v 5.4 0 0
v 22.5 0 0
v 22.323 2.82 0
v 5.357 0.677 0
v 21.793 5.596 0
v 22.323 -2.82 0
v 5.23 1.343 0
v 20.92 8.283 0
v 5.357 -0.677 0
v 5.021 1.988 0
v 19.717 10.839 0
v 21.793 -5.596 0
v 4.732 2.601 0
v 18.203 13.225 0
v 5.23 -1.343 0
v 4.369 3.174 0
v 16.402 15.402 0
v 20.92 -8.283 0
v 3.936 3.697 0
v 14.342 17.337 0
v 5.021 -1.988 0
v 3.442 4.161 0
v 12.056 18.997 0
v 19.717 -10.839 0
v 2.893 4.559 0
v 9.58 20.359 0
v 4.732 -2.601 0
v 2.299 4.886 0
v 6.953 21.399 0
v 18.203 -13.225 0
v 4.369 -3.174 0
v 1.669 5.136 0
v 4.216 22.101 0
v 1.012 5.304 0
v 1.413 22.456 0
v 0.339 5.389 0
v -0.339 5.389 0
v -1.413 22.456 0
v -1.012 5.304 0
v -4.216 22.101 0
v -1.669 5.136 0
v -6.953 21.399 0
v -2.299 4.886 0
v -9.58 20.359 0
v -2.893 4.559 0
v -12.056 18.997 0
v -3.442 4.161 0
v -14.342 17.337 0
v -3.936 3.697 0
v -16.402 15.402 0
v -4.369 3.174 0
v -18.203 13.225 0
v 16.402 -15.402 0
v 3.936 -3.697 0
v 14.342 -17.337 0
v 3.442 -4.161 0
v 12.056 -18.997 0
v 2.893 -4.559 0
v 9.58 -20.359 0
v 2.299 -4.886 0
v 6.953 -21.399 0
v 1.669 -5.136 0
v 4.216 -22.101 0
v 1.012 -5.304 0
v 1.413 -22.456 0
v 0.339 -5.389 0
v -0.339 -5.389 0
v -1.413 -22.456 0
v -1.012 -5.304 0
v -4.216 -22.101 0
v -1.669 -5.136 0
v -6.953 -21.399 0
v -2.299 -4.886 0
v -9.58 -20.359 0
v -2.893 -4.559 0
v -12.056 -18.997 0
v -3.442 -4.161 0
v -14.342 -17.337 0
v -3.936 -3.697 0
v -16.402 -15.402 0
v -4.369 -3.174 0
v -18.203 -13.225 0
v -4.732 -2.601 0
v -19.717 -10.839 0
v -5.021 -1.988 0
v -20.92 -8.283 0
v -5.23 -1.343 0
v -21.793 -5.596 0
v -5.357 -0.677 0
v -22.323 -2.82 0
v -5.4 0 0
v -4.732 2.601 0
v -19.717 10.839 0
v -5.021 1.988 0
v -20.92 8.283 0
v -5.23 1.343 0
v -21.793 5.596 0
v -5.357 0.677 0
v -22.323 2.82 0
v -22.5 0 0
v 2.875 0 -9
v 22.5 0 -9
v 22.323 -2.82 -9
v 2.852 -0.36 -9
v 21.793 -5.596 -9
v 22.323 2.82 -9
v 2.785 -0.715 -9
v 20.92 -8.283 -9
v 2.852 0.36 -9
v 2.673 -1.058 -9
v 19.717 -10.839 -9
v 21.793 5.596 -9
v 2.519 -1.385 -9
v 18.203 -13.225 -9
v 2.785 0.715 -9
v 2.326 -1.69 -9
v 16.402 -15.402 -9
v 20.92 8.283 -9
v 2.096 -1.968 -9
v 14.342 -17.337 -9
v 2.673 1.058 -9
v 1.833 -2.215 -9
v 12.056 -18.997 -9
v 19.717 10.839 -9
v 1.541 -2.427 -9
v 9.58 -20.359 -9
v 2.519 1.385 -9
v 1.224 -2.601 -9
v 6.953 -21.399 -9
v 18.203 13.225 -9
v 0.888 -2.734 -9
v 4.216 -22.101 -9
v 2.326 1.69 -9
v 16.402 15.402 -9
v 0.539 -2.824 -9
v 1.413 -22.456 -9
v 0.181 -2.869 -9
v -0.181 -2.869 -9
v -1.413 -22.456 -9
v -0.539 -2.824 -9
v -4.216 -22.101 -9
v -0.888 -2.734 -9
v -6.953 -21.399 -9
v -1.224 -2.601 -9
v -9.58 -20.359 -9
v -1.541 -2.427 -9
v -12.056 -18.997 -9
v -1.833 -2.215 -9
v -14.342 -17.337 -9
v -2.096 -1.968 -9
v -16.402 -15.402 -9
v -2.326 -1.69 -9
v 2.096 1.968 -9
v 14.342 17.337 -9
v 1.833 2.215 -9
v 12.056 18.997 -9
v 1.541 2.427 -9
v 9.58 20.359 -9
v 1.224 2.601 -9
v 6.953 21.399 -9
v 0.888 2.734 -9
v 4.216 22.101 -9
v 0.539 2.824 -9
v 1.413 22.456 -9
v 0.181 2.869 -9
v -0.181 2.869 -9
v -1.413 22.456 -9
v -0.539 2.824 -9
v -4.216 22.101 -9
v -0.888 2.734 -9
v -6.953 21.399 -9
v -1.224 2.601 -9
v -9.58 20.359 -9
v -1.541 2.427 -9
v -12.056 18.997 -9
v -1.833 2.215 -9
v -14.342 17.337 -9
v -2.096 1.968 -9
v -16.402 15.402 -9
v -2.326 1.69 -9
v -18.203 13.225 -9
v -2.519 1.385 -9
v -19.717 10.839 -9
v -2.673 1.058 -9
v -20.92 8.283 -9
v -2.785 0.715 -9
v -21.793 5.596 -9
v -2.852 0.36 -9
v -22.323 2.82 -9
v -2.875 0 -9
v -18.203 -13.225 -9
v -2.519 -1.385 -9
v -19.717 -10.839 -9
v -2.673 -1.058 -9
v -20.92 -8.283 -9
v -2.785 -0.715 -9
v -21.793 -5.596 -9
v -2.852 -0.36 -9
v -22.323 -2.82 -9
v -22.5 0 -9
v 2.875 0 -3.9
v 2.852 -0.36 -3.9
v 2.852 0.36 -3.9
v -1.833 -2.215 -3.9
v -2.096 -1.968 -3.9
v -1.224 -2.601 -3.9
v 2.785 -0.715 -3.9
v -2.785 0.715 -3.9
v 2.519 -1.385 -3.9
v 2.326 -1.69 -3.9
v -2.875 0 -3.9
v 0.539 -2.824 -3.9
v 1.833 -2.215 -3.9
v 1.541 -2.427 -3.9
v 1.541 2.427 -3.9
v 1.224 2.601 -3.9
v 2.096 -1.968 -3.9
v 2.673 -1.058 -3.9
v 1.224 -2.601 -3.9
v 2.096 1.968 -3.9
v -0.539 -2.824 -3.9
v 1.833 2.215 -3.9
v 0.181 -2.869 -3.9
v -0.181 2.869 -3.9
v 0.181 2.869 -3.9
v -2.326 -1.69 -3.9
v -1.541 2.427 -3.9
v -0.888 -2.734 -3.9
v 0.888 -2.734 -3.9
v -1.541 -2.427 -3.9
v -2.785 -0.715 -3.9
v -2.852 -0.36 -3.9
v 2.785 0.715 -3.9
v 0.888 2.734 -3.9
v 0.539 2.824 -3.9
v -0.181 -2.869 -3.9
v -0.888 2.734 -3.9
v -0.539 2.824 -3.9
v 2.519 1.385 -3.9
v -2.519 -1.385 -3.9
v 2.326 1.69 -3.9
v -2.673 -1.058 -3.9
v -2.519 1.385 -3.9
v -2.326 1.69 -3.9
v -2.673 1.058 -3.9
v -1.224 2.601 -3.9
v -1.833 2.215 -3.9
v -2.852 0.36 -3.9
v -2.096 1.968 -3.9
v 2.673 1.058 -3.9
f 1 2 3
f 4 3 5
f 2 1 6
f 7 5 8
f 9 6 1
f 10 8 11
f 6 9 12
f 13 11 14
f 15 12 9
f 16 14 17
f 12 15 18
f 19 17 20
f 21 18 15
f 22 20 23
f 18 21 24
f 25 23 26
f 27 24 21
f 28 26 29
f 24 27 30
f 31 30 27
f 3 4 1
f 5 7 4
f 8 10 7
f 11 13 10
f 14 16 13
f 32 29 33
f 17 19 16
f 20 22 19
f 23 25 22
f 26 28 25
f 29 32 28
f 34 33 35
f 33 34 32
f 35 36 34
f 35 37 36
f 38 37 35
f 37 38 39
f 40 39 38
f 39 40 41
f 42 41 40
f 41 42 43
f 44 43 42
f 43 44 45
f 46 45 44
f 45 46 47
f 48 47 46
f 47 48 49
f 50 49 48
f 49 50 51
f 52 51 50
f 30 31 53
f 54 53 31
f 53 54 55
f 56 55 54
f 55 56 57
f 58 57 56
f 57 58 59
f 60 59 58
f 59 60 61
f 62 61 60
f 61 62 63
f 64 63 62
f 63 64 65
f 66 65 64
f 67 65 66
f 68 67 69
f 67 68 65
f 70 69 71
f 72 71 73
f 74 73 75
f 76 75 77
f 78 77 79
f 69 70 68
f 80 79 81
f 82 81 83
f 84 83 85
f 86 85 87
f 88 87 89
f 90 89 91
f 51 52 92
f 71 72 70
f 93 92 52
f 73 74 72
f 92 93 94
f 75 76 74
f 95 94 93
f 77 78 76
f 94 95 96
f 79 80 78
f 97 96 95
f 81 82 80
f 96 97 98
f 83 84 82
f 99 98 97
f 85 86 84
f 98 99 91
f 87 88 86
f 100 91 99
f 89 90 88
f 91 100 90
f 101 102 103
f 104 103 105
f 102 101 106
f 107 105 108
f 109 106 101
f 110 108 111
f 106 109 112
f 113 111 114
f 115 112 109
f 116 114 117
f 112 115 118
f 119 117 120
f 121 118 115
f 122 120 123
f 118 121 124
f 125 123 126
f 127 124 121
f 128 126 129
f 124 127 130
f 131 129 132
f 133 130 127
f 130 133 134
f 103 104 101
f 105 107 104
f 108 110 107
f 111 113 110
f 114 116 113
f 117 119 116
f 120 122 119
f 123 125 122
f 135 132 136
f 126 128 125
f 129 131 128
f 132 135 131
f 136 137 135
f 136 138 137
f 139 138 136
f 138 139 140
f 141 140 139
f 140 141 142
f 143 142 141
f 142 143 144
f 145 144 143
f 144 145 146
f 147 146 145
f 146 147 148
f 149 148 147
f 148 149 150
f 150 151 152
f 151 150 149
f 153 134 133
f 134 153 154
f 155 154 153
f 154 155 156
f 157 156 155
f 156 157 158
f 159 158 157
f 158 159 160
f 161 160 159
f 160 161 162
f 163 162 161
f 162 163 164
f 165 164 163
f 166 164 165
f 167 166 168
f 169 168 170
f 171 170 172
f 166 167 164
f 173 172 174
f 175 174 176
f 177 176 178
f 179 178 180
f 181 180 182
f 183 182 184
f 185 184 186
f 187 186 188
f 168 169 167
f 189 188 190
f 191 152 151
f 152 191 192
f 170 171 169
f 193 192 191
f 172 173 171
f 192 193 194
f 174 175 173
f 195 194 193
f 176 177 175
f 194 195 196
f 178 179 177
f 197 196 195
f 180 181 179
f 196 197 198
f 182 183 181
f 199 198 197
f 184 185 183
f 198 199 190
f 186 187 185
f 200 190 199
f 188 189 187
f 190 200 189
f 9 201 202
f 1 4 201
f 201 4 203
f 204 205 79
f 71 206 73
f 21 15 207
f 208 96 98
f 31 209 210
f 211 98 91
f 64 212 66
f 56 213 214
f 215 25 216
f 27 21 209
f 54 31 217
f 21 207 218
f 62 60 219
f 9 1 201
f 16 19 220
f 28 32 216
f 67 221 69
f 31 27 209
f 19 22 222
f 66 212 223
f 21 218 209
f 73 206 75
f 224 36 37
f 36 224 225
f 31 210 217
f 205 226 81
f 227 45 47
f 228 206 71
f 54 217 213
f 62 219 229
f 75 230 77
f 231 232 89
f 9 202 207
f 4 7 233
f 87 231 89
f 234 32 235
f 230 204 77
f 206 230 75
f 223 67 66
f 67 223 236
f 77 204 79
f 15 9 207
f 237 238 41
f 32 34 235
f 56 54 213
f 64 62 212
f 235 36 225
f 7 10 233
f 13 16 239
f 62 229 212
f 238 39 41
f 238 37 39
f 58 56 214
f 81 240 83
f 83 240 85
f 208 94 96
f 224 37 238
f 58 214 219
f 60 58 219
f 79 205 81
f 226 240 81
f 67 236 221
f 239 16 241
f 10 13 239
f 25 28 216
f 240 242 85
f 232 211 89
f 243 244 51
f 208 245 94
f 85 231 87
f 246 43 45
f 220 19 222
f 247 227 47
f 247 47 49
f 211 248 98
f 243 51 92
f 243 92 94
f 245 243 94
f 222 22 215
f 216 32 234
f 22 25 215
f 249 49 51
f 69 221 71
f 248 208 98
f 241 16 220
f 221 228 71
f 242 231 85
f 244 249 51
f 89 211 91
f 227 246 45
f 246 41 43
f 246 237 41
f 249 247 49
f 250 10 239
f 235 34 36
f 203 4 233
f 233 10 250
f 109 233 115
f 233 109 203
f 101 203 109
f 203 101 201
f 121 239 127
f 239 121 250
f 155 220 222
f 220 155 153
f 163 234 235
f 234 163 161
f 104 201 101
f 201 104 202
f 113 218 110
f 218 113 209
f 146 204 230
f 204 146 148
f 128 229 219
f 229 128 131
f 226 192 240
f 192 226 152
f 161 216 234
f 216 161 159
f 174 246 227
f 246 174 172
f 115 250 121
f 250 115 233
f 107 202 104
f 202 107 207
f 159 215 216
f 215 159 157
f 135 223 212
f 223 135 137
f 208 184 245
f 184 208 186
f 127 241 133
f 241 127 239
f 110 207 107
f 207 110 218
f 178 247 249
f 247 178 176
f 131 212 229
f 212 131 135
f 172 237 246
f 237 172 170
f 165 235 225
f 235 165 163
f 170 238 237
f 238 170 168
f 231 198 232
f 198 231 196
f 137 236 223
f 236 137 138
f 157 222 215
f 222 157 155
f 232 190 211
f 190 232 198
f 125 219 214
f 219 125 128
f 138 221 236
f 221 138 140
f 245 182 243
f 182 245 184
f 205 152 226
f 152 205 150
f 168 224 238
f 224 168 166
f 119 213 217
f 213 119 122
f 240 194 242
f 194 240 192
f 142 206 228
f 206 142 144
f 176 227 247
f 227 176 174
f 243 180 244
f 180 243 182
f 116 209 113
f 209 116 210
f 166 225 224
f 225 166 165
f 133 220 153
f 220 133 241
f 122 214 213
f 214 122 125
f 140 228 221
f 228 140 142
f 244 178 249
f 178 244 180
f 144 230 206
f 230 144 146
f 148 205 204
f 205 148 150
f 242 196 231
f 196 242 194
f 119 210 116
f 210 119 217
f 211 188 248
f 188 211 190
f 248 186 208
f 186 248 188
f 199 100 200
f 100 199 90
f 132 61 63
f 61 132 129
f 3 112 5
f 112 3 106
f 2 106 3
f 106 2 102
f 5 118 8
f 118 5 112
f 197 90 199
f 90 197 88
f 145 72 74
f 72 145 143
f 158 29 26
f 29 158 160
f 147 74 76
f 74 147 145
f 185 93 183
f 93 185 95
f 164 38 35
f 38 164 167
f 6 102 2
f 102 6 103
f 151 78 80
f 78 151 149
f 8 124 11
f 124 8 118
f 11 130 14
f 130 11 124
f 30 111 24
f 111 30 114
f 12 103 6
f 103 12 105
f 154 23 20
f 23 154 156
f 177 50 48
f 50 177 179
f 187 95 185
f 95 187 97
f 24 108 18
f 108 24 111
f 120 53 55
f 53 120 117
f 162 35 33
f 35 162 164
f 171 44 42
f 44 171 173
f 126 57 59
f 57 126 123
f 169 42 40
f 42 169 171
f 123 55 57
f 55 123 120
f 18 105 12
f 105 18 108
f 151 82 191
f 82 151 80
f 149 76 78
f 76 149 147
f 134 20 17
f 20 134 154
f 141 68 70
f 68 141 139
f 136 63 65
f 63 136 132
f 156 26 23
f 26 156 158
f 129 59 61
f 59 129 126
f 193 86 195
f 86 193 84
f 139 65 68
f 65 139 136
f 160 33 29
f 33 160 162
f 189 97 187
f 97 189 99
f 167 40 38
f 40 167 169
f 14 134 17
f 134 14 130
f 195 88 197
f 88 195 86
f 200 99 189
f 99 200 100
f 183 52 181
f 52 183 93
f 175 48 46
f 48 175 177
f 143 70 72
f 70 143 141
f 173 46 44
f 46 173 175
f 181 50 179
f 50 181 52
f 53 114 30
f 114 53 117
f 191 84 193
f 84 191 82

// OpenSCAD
$fn = 50;


difference() {
	union() {
		translate(v = [0, 0, -9.0000000000]) {
			cylinder(h = 9, r = 22.5000000000);
		}
	}
	union() {
		translate(v = [0, 0, 0]) {
			rotate(a = [0, 0, 0]) {
				difference() {
					union() {
						#translate(v = [0, 0, -9.0000000000]) {
							cylinder(h = 9, r = 2.6000000000);
						}
						#translate(v = [0, 0, -3.9000000000]) {
							cylinder(h = 3.9000000000, r1 = 2.8750000000, r2 = 5.4000000000);
						}
						#translate(v = [0, 0, -9.0000000000]) {
							cylinder(h = 9, r = 2.8750000000);
						}
						#translate(v = [0, 0, -9.0000000000]) {
							cylinder(h = 9, r = 2.6000000000);
						}
					}
					union();
				}
			}
		}
	}
}
